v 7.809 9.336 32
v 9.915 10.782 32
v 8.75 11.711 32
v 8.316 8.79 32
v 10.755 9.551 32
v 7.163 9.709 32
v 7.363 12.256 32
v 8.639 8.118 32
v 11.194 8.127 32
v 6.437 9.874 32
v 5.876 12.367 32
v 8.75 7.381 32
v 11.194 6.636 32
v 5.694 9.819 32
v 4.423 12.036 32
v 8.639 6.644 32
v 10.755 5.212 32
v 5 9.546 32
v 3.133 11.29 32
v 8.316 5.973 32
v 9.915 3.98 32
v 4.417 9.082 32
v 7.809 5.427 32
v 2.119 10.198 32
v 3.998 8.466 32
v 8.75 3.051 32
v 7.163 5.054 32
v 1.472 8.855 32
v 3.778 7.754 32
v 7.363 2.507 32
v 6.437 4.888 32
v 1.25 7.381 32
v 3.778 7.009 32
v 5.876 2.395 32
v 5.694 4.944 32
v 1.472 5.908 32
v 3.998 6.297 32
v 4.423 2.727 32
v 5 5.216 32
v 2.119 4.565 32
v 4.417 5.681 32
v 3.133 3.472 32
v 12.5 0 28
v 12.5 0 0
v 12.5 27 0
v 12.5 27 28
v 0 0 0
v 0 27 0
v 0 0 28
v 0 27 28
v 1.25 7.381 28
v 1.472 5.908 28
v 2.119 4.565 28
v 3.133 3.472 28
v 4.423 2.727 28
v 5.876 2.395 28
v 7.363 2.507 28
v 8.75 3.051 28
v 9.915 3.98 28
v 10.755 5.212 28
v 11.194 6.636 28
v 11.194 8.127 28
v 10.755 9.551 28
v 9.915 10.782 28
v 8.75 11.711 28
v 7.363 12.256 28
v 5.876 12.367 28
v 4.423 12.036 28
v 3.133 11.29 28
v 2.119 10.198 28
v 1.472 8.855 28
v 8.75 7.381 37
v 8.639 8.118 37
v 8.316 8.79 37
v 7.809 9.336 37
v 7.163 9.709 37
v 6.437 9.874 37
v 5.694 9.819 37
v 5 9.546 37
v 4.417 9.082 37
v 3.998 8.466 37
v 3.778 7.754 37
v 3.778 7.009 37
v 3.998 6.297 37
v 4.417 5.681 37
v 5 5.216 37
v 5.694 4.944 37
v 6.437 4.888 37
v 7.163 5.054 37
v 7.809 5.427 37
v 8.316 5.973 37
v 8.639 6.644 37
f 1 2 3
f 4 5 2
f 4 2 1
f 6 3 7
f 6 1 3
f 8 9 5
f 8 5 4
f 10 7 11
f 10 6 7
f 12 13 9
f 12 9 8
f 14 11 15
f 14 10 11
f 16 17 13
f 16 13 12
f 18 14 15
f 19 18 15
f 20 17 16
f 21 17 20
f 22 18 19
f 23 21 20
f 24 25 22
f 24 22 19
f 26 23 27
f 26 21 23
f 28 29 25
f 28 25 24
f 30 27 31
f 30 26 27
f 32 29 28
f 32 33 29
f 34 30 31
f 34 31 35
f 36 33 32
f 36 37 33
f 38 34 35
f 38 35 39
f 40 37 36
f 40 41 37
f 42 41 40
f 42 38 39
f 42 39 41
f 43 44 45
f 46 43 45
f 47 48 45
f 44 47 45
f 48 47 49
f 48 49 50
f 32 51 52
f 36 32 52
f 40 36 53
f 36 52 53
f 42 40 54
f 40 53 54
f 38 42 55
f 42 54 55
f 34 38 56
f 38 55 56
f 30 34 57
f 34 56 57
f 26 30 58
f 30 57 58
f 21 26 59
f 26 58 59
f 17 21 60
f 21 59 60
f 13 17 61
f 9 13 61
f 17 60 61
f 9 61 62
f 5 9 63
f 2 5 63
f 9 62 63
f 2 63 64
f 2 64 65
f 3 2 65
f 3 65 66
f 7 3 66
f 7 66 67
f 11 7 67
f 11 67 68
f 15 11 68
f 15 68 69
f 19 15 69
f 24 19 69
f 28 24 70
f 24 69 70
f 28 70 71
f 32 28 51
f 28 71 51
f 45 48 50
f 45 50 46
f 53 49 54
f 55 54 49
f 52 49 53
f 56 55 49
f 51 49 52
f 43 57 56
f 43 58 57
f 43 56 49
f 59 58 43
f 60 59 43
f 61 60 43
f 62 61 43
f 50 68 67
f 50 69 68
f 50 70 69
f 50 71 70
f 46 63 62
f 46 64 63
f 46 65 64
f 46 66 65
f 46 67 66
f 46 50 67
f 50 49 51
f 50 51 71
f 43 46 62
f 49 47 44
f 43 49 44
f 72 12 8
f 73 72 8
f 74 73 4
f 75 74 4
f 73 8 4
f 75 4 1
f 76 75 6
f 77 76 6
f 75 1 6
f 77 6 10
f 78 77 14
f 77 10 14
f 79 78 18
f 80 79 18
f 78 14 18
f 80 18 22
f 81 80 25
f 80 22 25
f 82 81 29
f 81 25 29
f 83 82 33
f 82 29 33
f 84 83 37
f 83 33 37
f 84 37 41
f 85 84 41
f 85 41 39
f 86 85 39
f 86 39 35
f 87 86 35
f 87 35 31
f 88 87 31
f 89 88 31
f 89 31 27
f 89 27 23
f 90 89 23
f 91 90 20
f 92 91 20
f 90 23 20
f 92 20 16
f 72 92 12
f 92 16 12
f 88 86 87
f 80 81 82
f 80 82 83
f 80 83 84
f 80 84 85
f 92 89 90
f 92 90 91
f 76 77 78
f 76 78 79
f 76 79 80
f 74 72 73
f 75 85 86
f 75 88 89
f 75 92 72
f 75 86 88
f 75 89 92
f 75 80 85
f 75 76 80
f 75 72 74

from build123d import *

# Parameters (mm, degrees)
SKETCH2_W           = 12.5
SKETCH2_H           = 27
BOSS_EXTRUDE1_DEPTH = 28
SKETCH3_R           = 5
BOSS_EXTRUDE2_DEPTH = 4
SKETCH4_R           = 2.5
BOSS_EXTRUDE3_DEPTH = 5


with BuildPart() as part:
    # Sketch2 → Boss-Extrude1 (new body)
    with BuildSketch(Plane.XY):
        with Locations((6.25, 13.5)):
            Rectangle(SKETCH2_W, SKETCH2_H)
    extrude(amount=BOSS_EXTRUDE1_DEPTH)

    # Sketch3 → Boss-Extrude2 (add)
    with BuildSketch(Plane.XY.offset(28)):
        with Locations(Location((6.25, 7.381333163, 0), (0, 0, 180))):
            Circle(SKETCH3_R)
    extrude(amount=BOSS_EXTRUDE2_DEPTH)

    # Sketch4 → Boss-Extrude3 (add)
    with BuildSketch(Plane.XY.offset(32)):
        with Locations((6.25, 7.381333163)):
            Circle(SKETCH4_R)
    extrude(amount=BOSS_EXTRUDE3_DEPTH)


solid = part.part
